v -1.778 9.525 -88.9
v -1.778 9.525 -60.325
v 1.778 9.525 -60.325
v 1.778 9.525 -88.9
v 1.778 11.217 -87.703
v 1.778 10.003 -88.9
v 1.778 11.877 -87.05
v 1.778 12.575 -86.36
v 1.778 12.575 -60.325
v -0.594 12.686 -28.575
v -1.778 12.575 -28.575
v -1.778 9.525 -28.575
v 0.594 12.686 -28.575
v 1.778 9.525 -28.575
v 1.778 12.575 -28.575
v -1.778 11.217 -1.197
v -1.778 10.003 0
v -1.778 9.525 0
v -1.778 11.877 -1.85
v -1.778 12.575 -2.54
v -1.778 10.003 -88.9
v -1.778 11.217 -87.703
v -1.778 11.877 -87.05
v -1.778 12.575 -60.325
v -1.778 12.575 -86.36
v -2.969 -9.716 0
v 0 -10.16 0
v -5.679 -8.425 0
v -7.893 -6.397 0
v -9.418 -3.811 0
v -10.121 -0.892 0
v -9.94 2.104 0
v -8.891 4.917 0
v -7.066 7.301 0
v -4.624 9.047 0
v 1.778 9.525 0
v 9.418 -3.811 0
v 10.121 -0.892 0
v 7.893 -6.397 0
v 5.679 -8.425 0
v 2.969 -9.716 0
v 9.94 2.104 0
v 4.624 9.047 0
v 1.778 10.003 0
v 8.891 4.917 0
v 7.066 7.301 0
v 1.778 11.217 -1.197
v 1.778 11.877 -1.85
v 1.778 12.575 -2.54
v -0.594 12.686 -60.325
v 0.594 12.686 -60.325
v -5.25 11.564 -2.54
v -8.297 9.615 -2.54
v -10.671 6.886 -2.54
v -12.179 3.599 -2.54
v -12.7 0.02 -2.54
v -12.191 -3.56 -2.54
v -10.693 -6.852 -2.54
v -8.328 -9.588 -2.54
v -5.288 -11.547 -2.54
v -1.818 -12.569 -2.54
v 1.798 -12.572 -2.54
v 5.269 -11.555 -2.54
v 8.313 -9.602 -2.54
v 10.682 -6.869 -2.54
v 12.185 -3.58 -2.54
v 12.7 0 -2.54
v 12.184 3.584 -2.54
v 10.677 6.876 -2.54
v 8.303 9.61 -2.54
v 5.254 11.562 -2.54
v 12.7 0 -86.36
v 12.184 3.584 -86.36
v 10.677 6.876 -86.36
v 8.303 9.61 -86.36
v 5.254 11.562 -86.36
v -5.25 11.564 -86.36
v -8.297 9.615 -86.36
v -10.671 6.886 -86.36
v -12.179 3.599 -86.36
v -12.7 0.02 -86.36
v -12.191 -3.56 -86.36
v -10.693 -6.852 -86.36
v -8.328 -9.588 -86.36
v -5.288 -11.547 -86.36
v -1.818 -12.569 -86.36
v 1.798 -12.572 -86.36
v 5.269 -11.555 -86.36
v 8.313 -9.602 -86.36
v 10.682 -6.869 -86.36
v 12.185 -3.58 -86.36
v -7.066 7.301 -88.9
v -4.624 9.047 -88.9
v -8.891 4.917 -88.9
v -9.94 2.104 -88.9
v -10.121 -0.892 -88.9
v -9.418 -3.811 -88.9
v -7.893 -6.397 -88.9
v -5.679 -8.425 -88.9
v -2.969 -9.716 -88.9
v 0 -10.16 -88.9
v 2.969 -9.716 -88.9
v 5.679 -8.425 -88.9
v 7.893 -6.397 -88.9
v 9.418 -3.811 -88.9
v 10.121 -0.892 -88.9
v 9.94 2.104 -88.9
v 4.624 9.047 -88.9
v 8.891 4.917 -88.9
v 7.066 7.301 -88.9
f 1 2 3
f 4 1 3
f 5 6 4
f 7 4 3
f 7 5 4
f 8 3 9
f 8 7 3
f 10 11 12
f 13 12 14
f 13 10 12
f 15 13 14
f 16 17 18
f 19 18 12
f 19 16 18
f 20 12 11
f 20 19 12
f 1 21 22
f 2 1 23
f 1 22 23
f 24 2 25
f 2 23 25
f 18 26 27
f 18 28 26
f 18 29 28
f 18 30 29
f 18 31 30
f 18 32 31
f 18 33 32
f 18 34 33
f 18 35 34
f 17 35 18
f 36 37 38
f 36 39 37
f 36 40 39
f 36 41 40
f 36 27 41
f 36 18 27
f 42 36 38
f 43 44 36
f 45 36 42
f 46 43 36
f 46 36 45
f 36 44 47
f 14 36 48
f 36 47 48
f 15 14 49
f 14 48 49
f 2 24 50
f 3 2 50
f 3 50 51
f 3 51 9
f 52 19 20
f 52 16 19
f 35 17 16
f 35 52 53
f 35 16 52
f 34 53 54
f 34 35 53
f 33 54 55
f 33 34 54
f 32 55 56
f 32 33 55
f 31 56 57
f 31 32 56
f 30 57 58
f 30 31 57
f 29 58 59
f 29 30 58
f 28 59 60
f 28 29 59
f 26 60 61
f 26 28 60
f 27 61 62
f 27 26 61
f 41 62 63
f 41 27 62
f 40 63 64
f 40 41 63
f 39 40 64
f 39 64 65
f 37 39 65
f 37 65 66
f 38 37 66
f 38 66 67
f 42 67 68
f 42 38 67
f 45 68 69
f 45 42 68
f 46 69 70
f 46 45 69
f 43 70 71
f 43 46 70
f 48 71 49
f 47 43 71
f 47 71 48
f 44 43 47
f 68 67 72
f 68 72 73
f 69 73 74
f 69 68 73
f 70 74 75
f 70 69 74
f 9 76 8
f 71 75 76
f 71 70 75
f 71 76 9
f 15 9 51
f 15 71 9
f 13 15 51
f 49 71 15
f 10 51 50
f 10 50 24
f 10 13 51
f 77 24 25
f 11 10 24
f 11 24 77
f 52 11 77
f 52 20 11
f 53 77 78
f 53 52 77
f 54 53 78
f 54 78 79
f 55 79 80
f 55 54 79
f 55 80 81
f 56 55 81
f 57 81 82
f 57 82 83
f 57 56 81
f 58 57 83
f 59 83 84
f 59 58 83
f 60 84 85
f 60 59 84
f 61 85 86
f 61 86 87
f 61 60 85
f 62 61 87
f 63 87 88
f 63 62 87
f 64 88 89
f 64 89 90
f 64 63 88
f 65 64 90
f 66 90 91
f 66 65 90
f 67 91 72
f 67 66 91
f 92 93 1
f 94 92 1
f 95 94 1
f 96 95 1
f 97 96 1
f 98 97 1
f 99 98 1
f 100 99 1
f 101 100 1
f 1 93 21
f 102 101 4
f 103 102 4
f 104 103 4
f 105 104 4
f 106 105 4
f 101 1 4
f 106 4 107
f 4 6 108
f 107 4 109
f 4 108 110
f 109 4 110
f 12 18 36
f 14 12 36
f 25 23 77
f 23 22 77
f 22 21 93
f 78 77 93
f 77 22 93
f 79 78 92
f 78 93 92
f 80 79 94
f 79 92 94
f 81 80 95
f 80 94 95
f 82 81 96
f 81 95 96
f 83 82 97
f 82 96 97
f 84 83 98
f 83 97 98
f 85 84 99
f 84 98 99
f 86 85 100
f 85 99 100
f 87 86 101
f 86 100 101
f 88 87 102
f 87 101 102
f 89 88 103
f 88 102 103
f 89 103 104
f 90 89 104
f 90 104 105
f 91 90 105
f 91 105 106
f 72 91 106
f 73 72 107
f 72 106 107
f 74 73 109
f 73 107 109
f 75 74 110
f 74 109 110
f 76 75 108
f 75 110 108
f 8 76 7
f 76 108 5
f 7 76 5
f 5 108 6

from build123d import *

# Parameters (mm, degrees)
SKETCH1_R      = 12.7
EXTRUDE1_DEPTH = 88.9
SKETCH2_W      = 3.556
SKETCH2_H      = 3.175
EXTRUDE2_DEPTH = 28.575
CHAMFER1_SIZE  = 2.54
CHAMFER2_SIZE  = 2.54


with BuildPart() as part:
    # Sketch1 → Extrude1 (new body)
    with BuildSketch(Plane.XY):
        Circle(SKETCH1_R)
    extrude(amount=-EXTRUDE1_DEPTH)

    # Sketch2 → Extrude2 (cut)
    with BuildSketch(Plane.XY):
        with Locations((0, 11.1125)):
            Rectangle(SKETCH2_W, SKETCH2_H)
    extrude2 = extrude(amount=-EXTRUDE2_DEPTH, mode=Mode.SUBTRACT)

    # Chamfer1
    chamfer1_edges = [part.edges().sort_by_distance(p)[0] for p in [
        (-8.327946926, -9.588289733, 0),
    ]]
    chamfer(chamfer1_edges, length=CHAMFER1_SIZE)

    # Mirror5: Extrude2 across plane
    add(extrude2.mirror(Plane.XY.offset(-44.45)), mode=Mode.SUBTRACT)

    # Chamfer2
    chamfer2_edges = [part.edges().sort_by_distance(p)[0] for p in [
        (-8.327946926, -9.588289733, -88.9),
    ]]
    chamfer(chamfer2_edges, length=CHAMFER2_SIZE)


solid = part.part
